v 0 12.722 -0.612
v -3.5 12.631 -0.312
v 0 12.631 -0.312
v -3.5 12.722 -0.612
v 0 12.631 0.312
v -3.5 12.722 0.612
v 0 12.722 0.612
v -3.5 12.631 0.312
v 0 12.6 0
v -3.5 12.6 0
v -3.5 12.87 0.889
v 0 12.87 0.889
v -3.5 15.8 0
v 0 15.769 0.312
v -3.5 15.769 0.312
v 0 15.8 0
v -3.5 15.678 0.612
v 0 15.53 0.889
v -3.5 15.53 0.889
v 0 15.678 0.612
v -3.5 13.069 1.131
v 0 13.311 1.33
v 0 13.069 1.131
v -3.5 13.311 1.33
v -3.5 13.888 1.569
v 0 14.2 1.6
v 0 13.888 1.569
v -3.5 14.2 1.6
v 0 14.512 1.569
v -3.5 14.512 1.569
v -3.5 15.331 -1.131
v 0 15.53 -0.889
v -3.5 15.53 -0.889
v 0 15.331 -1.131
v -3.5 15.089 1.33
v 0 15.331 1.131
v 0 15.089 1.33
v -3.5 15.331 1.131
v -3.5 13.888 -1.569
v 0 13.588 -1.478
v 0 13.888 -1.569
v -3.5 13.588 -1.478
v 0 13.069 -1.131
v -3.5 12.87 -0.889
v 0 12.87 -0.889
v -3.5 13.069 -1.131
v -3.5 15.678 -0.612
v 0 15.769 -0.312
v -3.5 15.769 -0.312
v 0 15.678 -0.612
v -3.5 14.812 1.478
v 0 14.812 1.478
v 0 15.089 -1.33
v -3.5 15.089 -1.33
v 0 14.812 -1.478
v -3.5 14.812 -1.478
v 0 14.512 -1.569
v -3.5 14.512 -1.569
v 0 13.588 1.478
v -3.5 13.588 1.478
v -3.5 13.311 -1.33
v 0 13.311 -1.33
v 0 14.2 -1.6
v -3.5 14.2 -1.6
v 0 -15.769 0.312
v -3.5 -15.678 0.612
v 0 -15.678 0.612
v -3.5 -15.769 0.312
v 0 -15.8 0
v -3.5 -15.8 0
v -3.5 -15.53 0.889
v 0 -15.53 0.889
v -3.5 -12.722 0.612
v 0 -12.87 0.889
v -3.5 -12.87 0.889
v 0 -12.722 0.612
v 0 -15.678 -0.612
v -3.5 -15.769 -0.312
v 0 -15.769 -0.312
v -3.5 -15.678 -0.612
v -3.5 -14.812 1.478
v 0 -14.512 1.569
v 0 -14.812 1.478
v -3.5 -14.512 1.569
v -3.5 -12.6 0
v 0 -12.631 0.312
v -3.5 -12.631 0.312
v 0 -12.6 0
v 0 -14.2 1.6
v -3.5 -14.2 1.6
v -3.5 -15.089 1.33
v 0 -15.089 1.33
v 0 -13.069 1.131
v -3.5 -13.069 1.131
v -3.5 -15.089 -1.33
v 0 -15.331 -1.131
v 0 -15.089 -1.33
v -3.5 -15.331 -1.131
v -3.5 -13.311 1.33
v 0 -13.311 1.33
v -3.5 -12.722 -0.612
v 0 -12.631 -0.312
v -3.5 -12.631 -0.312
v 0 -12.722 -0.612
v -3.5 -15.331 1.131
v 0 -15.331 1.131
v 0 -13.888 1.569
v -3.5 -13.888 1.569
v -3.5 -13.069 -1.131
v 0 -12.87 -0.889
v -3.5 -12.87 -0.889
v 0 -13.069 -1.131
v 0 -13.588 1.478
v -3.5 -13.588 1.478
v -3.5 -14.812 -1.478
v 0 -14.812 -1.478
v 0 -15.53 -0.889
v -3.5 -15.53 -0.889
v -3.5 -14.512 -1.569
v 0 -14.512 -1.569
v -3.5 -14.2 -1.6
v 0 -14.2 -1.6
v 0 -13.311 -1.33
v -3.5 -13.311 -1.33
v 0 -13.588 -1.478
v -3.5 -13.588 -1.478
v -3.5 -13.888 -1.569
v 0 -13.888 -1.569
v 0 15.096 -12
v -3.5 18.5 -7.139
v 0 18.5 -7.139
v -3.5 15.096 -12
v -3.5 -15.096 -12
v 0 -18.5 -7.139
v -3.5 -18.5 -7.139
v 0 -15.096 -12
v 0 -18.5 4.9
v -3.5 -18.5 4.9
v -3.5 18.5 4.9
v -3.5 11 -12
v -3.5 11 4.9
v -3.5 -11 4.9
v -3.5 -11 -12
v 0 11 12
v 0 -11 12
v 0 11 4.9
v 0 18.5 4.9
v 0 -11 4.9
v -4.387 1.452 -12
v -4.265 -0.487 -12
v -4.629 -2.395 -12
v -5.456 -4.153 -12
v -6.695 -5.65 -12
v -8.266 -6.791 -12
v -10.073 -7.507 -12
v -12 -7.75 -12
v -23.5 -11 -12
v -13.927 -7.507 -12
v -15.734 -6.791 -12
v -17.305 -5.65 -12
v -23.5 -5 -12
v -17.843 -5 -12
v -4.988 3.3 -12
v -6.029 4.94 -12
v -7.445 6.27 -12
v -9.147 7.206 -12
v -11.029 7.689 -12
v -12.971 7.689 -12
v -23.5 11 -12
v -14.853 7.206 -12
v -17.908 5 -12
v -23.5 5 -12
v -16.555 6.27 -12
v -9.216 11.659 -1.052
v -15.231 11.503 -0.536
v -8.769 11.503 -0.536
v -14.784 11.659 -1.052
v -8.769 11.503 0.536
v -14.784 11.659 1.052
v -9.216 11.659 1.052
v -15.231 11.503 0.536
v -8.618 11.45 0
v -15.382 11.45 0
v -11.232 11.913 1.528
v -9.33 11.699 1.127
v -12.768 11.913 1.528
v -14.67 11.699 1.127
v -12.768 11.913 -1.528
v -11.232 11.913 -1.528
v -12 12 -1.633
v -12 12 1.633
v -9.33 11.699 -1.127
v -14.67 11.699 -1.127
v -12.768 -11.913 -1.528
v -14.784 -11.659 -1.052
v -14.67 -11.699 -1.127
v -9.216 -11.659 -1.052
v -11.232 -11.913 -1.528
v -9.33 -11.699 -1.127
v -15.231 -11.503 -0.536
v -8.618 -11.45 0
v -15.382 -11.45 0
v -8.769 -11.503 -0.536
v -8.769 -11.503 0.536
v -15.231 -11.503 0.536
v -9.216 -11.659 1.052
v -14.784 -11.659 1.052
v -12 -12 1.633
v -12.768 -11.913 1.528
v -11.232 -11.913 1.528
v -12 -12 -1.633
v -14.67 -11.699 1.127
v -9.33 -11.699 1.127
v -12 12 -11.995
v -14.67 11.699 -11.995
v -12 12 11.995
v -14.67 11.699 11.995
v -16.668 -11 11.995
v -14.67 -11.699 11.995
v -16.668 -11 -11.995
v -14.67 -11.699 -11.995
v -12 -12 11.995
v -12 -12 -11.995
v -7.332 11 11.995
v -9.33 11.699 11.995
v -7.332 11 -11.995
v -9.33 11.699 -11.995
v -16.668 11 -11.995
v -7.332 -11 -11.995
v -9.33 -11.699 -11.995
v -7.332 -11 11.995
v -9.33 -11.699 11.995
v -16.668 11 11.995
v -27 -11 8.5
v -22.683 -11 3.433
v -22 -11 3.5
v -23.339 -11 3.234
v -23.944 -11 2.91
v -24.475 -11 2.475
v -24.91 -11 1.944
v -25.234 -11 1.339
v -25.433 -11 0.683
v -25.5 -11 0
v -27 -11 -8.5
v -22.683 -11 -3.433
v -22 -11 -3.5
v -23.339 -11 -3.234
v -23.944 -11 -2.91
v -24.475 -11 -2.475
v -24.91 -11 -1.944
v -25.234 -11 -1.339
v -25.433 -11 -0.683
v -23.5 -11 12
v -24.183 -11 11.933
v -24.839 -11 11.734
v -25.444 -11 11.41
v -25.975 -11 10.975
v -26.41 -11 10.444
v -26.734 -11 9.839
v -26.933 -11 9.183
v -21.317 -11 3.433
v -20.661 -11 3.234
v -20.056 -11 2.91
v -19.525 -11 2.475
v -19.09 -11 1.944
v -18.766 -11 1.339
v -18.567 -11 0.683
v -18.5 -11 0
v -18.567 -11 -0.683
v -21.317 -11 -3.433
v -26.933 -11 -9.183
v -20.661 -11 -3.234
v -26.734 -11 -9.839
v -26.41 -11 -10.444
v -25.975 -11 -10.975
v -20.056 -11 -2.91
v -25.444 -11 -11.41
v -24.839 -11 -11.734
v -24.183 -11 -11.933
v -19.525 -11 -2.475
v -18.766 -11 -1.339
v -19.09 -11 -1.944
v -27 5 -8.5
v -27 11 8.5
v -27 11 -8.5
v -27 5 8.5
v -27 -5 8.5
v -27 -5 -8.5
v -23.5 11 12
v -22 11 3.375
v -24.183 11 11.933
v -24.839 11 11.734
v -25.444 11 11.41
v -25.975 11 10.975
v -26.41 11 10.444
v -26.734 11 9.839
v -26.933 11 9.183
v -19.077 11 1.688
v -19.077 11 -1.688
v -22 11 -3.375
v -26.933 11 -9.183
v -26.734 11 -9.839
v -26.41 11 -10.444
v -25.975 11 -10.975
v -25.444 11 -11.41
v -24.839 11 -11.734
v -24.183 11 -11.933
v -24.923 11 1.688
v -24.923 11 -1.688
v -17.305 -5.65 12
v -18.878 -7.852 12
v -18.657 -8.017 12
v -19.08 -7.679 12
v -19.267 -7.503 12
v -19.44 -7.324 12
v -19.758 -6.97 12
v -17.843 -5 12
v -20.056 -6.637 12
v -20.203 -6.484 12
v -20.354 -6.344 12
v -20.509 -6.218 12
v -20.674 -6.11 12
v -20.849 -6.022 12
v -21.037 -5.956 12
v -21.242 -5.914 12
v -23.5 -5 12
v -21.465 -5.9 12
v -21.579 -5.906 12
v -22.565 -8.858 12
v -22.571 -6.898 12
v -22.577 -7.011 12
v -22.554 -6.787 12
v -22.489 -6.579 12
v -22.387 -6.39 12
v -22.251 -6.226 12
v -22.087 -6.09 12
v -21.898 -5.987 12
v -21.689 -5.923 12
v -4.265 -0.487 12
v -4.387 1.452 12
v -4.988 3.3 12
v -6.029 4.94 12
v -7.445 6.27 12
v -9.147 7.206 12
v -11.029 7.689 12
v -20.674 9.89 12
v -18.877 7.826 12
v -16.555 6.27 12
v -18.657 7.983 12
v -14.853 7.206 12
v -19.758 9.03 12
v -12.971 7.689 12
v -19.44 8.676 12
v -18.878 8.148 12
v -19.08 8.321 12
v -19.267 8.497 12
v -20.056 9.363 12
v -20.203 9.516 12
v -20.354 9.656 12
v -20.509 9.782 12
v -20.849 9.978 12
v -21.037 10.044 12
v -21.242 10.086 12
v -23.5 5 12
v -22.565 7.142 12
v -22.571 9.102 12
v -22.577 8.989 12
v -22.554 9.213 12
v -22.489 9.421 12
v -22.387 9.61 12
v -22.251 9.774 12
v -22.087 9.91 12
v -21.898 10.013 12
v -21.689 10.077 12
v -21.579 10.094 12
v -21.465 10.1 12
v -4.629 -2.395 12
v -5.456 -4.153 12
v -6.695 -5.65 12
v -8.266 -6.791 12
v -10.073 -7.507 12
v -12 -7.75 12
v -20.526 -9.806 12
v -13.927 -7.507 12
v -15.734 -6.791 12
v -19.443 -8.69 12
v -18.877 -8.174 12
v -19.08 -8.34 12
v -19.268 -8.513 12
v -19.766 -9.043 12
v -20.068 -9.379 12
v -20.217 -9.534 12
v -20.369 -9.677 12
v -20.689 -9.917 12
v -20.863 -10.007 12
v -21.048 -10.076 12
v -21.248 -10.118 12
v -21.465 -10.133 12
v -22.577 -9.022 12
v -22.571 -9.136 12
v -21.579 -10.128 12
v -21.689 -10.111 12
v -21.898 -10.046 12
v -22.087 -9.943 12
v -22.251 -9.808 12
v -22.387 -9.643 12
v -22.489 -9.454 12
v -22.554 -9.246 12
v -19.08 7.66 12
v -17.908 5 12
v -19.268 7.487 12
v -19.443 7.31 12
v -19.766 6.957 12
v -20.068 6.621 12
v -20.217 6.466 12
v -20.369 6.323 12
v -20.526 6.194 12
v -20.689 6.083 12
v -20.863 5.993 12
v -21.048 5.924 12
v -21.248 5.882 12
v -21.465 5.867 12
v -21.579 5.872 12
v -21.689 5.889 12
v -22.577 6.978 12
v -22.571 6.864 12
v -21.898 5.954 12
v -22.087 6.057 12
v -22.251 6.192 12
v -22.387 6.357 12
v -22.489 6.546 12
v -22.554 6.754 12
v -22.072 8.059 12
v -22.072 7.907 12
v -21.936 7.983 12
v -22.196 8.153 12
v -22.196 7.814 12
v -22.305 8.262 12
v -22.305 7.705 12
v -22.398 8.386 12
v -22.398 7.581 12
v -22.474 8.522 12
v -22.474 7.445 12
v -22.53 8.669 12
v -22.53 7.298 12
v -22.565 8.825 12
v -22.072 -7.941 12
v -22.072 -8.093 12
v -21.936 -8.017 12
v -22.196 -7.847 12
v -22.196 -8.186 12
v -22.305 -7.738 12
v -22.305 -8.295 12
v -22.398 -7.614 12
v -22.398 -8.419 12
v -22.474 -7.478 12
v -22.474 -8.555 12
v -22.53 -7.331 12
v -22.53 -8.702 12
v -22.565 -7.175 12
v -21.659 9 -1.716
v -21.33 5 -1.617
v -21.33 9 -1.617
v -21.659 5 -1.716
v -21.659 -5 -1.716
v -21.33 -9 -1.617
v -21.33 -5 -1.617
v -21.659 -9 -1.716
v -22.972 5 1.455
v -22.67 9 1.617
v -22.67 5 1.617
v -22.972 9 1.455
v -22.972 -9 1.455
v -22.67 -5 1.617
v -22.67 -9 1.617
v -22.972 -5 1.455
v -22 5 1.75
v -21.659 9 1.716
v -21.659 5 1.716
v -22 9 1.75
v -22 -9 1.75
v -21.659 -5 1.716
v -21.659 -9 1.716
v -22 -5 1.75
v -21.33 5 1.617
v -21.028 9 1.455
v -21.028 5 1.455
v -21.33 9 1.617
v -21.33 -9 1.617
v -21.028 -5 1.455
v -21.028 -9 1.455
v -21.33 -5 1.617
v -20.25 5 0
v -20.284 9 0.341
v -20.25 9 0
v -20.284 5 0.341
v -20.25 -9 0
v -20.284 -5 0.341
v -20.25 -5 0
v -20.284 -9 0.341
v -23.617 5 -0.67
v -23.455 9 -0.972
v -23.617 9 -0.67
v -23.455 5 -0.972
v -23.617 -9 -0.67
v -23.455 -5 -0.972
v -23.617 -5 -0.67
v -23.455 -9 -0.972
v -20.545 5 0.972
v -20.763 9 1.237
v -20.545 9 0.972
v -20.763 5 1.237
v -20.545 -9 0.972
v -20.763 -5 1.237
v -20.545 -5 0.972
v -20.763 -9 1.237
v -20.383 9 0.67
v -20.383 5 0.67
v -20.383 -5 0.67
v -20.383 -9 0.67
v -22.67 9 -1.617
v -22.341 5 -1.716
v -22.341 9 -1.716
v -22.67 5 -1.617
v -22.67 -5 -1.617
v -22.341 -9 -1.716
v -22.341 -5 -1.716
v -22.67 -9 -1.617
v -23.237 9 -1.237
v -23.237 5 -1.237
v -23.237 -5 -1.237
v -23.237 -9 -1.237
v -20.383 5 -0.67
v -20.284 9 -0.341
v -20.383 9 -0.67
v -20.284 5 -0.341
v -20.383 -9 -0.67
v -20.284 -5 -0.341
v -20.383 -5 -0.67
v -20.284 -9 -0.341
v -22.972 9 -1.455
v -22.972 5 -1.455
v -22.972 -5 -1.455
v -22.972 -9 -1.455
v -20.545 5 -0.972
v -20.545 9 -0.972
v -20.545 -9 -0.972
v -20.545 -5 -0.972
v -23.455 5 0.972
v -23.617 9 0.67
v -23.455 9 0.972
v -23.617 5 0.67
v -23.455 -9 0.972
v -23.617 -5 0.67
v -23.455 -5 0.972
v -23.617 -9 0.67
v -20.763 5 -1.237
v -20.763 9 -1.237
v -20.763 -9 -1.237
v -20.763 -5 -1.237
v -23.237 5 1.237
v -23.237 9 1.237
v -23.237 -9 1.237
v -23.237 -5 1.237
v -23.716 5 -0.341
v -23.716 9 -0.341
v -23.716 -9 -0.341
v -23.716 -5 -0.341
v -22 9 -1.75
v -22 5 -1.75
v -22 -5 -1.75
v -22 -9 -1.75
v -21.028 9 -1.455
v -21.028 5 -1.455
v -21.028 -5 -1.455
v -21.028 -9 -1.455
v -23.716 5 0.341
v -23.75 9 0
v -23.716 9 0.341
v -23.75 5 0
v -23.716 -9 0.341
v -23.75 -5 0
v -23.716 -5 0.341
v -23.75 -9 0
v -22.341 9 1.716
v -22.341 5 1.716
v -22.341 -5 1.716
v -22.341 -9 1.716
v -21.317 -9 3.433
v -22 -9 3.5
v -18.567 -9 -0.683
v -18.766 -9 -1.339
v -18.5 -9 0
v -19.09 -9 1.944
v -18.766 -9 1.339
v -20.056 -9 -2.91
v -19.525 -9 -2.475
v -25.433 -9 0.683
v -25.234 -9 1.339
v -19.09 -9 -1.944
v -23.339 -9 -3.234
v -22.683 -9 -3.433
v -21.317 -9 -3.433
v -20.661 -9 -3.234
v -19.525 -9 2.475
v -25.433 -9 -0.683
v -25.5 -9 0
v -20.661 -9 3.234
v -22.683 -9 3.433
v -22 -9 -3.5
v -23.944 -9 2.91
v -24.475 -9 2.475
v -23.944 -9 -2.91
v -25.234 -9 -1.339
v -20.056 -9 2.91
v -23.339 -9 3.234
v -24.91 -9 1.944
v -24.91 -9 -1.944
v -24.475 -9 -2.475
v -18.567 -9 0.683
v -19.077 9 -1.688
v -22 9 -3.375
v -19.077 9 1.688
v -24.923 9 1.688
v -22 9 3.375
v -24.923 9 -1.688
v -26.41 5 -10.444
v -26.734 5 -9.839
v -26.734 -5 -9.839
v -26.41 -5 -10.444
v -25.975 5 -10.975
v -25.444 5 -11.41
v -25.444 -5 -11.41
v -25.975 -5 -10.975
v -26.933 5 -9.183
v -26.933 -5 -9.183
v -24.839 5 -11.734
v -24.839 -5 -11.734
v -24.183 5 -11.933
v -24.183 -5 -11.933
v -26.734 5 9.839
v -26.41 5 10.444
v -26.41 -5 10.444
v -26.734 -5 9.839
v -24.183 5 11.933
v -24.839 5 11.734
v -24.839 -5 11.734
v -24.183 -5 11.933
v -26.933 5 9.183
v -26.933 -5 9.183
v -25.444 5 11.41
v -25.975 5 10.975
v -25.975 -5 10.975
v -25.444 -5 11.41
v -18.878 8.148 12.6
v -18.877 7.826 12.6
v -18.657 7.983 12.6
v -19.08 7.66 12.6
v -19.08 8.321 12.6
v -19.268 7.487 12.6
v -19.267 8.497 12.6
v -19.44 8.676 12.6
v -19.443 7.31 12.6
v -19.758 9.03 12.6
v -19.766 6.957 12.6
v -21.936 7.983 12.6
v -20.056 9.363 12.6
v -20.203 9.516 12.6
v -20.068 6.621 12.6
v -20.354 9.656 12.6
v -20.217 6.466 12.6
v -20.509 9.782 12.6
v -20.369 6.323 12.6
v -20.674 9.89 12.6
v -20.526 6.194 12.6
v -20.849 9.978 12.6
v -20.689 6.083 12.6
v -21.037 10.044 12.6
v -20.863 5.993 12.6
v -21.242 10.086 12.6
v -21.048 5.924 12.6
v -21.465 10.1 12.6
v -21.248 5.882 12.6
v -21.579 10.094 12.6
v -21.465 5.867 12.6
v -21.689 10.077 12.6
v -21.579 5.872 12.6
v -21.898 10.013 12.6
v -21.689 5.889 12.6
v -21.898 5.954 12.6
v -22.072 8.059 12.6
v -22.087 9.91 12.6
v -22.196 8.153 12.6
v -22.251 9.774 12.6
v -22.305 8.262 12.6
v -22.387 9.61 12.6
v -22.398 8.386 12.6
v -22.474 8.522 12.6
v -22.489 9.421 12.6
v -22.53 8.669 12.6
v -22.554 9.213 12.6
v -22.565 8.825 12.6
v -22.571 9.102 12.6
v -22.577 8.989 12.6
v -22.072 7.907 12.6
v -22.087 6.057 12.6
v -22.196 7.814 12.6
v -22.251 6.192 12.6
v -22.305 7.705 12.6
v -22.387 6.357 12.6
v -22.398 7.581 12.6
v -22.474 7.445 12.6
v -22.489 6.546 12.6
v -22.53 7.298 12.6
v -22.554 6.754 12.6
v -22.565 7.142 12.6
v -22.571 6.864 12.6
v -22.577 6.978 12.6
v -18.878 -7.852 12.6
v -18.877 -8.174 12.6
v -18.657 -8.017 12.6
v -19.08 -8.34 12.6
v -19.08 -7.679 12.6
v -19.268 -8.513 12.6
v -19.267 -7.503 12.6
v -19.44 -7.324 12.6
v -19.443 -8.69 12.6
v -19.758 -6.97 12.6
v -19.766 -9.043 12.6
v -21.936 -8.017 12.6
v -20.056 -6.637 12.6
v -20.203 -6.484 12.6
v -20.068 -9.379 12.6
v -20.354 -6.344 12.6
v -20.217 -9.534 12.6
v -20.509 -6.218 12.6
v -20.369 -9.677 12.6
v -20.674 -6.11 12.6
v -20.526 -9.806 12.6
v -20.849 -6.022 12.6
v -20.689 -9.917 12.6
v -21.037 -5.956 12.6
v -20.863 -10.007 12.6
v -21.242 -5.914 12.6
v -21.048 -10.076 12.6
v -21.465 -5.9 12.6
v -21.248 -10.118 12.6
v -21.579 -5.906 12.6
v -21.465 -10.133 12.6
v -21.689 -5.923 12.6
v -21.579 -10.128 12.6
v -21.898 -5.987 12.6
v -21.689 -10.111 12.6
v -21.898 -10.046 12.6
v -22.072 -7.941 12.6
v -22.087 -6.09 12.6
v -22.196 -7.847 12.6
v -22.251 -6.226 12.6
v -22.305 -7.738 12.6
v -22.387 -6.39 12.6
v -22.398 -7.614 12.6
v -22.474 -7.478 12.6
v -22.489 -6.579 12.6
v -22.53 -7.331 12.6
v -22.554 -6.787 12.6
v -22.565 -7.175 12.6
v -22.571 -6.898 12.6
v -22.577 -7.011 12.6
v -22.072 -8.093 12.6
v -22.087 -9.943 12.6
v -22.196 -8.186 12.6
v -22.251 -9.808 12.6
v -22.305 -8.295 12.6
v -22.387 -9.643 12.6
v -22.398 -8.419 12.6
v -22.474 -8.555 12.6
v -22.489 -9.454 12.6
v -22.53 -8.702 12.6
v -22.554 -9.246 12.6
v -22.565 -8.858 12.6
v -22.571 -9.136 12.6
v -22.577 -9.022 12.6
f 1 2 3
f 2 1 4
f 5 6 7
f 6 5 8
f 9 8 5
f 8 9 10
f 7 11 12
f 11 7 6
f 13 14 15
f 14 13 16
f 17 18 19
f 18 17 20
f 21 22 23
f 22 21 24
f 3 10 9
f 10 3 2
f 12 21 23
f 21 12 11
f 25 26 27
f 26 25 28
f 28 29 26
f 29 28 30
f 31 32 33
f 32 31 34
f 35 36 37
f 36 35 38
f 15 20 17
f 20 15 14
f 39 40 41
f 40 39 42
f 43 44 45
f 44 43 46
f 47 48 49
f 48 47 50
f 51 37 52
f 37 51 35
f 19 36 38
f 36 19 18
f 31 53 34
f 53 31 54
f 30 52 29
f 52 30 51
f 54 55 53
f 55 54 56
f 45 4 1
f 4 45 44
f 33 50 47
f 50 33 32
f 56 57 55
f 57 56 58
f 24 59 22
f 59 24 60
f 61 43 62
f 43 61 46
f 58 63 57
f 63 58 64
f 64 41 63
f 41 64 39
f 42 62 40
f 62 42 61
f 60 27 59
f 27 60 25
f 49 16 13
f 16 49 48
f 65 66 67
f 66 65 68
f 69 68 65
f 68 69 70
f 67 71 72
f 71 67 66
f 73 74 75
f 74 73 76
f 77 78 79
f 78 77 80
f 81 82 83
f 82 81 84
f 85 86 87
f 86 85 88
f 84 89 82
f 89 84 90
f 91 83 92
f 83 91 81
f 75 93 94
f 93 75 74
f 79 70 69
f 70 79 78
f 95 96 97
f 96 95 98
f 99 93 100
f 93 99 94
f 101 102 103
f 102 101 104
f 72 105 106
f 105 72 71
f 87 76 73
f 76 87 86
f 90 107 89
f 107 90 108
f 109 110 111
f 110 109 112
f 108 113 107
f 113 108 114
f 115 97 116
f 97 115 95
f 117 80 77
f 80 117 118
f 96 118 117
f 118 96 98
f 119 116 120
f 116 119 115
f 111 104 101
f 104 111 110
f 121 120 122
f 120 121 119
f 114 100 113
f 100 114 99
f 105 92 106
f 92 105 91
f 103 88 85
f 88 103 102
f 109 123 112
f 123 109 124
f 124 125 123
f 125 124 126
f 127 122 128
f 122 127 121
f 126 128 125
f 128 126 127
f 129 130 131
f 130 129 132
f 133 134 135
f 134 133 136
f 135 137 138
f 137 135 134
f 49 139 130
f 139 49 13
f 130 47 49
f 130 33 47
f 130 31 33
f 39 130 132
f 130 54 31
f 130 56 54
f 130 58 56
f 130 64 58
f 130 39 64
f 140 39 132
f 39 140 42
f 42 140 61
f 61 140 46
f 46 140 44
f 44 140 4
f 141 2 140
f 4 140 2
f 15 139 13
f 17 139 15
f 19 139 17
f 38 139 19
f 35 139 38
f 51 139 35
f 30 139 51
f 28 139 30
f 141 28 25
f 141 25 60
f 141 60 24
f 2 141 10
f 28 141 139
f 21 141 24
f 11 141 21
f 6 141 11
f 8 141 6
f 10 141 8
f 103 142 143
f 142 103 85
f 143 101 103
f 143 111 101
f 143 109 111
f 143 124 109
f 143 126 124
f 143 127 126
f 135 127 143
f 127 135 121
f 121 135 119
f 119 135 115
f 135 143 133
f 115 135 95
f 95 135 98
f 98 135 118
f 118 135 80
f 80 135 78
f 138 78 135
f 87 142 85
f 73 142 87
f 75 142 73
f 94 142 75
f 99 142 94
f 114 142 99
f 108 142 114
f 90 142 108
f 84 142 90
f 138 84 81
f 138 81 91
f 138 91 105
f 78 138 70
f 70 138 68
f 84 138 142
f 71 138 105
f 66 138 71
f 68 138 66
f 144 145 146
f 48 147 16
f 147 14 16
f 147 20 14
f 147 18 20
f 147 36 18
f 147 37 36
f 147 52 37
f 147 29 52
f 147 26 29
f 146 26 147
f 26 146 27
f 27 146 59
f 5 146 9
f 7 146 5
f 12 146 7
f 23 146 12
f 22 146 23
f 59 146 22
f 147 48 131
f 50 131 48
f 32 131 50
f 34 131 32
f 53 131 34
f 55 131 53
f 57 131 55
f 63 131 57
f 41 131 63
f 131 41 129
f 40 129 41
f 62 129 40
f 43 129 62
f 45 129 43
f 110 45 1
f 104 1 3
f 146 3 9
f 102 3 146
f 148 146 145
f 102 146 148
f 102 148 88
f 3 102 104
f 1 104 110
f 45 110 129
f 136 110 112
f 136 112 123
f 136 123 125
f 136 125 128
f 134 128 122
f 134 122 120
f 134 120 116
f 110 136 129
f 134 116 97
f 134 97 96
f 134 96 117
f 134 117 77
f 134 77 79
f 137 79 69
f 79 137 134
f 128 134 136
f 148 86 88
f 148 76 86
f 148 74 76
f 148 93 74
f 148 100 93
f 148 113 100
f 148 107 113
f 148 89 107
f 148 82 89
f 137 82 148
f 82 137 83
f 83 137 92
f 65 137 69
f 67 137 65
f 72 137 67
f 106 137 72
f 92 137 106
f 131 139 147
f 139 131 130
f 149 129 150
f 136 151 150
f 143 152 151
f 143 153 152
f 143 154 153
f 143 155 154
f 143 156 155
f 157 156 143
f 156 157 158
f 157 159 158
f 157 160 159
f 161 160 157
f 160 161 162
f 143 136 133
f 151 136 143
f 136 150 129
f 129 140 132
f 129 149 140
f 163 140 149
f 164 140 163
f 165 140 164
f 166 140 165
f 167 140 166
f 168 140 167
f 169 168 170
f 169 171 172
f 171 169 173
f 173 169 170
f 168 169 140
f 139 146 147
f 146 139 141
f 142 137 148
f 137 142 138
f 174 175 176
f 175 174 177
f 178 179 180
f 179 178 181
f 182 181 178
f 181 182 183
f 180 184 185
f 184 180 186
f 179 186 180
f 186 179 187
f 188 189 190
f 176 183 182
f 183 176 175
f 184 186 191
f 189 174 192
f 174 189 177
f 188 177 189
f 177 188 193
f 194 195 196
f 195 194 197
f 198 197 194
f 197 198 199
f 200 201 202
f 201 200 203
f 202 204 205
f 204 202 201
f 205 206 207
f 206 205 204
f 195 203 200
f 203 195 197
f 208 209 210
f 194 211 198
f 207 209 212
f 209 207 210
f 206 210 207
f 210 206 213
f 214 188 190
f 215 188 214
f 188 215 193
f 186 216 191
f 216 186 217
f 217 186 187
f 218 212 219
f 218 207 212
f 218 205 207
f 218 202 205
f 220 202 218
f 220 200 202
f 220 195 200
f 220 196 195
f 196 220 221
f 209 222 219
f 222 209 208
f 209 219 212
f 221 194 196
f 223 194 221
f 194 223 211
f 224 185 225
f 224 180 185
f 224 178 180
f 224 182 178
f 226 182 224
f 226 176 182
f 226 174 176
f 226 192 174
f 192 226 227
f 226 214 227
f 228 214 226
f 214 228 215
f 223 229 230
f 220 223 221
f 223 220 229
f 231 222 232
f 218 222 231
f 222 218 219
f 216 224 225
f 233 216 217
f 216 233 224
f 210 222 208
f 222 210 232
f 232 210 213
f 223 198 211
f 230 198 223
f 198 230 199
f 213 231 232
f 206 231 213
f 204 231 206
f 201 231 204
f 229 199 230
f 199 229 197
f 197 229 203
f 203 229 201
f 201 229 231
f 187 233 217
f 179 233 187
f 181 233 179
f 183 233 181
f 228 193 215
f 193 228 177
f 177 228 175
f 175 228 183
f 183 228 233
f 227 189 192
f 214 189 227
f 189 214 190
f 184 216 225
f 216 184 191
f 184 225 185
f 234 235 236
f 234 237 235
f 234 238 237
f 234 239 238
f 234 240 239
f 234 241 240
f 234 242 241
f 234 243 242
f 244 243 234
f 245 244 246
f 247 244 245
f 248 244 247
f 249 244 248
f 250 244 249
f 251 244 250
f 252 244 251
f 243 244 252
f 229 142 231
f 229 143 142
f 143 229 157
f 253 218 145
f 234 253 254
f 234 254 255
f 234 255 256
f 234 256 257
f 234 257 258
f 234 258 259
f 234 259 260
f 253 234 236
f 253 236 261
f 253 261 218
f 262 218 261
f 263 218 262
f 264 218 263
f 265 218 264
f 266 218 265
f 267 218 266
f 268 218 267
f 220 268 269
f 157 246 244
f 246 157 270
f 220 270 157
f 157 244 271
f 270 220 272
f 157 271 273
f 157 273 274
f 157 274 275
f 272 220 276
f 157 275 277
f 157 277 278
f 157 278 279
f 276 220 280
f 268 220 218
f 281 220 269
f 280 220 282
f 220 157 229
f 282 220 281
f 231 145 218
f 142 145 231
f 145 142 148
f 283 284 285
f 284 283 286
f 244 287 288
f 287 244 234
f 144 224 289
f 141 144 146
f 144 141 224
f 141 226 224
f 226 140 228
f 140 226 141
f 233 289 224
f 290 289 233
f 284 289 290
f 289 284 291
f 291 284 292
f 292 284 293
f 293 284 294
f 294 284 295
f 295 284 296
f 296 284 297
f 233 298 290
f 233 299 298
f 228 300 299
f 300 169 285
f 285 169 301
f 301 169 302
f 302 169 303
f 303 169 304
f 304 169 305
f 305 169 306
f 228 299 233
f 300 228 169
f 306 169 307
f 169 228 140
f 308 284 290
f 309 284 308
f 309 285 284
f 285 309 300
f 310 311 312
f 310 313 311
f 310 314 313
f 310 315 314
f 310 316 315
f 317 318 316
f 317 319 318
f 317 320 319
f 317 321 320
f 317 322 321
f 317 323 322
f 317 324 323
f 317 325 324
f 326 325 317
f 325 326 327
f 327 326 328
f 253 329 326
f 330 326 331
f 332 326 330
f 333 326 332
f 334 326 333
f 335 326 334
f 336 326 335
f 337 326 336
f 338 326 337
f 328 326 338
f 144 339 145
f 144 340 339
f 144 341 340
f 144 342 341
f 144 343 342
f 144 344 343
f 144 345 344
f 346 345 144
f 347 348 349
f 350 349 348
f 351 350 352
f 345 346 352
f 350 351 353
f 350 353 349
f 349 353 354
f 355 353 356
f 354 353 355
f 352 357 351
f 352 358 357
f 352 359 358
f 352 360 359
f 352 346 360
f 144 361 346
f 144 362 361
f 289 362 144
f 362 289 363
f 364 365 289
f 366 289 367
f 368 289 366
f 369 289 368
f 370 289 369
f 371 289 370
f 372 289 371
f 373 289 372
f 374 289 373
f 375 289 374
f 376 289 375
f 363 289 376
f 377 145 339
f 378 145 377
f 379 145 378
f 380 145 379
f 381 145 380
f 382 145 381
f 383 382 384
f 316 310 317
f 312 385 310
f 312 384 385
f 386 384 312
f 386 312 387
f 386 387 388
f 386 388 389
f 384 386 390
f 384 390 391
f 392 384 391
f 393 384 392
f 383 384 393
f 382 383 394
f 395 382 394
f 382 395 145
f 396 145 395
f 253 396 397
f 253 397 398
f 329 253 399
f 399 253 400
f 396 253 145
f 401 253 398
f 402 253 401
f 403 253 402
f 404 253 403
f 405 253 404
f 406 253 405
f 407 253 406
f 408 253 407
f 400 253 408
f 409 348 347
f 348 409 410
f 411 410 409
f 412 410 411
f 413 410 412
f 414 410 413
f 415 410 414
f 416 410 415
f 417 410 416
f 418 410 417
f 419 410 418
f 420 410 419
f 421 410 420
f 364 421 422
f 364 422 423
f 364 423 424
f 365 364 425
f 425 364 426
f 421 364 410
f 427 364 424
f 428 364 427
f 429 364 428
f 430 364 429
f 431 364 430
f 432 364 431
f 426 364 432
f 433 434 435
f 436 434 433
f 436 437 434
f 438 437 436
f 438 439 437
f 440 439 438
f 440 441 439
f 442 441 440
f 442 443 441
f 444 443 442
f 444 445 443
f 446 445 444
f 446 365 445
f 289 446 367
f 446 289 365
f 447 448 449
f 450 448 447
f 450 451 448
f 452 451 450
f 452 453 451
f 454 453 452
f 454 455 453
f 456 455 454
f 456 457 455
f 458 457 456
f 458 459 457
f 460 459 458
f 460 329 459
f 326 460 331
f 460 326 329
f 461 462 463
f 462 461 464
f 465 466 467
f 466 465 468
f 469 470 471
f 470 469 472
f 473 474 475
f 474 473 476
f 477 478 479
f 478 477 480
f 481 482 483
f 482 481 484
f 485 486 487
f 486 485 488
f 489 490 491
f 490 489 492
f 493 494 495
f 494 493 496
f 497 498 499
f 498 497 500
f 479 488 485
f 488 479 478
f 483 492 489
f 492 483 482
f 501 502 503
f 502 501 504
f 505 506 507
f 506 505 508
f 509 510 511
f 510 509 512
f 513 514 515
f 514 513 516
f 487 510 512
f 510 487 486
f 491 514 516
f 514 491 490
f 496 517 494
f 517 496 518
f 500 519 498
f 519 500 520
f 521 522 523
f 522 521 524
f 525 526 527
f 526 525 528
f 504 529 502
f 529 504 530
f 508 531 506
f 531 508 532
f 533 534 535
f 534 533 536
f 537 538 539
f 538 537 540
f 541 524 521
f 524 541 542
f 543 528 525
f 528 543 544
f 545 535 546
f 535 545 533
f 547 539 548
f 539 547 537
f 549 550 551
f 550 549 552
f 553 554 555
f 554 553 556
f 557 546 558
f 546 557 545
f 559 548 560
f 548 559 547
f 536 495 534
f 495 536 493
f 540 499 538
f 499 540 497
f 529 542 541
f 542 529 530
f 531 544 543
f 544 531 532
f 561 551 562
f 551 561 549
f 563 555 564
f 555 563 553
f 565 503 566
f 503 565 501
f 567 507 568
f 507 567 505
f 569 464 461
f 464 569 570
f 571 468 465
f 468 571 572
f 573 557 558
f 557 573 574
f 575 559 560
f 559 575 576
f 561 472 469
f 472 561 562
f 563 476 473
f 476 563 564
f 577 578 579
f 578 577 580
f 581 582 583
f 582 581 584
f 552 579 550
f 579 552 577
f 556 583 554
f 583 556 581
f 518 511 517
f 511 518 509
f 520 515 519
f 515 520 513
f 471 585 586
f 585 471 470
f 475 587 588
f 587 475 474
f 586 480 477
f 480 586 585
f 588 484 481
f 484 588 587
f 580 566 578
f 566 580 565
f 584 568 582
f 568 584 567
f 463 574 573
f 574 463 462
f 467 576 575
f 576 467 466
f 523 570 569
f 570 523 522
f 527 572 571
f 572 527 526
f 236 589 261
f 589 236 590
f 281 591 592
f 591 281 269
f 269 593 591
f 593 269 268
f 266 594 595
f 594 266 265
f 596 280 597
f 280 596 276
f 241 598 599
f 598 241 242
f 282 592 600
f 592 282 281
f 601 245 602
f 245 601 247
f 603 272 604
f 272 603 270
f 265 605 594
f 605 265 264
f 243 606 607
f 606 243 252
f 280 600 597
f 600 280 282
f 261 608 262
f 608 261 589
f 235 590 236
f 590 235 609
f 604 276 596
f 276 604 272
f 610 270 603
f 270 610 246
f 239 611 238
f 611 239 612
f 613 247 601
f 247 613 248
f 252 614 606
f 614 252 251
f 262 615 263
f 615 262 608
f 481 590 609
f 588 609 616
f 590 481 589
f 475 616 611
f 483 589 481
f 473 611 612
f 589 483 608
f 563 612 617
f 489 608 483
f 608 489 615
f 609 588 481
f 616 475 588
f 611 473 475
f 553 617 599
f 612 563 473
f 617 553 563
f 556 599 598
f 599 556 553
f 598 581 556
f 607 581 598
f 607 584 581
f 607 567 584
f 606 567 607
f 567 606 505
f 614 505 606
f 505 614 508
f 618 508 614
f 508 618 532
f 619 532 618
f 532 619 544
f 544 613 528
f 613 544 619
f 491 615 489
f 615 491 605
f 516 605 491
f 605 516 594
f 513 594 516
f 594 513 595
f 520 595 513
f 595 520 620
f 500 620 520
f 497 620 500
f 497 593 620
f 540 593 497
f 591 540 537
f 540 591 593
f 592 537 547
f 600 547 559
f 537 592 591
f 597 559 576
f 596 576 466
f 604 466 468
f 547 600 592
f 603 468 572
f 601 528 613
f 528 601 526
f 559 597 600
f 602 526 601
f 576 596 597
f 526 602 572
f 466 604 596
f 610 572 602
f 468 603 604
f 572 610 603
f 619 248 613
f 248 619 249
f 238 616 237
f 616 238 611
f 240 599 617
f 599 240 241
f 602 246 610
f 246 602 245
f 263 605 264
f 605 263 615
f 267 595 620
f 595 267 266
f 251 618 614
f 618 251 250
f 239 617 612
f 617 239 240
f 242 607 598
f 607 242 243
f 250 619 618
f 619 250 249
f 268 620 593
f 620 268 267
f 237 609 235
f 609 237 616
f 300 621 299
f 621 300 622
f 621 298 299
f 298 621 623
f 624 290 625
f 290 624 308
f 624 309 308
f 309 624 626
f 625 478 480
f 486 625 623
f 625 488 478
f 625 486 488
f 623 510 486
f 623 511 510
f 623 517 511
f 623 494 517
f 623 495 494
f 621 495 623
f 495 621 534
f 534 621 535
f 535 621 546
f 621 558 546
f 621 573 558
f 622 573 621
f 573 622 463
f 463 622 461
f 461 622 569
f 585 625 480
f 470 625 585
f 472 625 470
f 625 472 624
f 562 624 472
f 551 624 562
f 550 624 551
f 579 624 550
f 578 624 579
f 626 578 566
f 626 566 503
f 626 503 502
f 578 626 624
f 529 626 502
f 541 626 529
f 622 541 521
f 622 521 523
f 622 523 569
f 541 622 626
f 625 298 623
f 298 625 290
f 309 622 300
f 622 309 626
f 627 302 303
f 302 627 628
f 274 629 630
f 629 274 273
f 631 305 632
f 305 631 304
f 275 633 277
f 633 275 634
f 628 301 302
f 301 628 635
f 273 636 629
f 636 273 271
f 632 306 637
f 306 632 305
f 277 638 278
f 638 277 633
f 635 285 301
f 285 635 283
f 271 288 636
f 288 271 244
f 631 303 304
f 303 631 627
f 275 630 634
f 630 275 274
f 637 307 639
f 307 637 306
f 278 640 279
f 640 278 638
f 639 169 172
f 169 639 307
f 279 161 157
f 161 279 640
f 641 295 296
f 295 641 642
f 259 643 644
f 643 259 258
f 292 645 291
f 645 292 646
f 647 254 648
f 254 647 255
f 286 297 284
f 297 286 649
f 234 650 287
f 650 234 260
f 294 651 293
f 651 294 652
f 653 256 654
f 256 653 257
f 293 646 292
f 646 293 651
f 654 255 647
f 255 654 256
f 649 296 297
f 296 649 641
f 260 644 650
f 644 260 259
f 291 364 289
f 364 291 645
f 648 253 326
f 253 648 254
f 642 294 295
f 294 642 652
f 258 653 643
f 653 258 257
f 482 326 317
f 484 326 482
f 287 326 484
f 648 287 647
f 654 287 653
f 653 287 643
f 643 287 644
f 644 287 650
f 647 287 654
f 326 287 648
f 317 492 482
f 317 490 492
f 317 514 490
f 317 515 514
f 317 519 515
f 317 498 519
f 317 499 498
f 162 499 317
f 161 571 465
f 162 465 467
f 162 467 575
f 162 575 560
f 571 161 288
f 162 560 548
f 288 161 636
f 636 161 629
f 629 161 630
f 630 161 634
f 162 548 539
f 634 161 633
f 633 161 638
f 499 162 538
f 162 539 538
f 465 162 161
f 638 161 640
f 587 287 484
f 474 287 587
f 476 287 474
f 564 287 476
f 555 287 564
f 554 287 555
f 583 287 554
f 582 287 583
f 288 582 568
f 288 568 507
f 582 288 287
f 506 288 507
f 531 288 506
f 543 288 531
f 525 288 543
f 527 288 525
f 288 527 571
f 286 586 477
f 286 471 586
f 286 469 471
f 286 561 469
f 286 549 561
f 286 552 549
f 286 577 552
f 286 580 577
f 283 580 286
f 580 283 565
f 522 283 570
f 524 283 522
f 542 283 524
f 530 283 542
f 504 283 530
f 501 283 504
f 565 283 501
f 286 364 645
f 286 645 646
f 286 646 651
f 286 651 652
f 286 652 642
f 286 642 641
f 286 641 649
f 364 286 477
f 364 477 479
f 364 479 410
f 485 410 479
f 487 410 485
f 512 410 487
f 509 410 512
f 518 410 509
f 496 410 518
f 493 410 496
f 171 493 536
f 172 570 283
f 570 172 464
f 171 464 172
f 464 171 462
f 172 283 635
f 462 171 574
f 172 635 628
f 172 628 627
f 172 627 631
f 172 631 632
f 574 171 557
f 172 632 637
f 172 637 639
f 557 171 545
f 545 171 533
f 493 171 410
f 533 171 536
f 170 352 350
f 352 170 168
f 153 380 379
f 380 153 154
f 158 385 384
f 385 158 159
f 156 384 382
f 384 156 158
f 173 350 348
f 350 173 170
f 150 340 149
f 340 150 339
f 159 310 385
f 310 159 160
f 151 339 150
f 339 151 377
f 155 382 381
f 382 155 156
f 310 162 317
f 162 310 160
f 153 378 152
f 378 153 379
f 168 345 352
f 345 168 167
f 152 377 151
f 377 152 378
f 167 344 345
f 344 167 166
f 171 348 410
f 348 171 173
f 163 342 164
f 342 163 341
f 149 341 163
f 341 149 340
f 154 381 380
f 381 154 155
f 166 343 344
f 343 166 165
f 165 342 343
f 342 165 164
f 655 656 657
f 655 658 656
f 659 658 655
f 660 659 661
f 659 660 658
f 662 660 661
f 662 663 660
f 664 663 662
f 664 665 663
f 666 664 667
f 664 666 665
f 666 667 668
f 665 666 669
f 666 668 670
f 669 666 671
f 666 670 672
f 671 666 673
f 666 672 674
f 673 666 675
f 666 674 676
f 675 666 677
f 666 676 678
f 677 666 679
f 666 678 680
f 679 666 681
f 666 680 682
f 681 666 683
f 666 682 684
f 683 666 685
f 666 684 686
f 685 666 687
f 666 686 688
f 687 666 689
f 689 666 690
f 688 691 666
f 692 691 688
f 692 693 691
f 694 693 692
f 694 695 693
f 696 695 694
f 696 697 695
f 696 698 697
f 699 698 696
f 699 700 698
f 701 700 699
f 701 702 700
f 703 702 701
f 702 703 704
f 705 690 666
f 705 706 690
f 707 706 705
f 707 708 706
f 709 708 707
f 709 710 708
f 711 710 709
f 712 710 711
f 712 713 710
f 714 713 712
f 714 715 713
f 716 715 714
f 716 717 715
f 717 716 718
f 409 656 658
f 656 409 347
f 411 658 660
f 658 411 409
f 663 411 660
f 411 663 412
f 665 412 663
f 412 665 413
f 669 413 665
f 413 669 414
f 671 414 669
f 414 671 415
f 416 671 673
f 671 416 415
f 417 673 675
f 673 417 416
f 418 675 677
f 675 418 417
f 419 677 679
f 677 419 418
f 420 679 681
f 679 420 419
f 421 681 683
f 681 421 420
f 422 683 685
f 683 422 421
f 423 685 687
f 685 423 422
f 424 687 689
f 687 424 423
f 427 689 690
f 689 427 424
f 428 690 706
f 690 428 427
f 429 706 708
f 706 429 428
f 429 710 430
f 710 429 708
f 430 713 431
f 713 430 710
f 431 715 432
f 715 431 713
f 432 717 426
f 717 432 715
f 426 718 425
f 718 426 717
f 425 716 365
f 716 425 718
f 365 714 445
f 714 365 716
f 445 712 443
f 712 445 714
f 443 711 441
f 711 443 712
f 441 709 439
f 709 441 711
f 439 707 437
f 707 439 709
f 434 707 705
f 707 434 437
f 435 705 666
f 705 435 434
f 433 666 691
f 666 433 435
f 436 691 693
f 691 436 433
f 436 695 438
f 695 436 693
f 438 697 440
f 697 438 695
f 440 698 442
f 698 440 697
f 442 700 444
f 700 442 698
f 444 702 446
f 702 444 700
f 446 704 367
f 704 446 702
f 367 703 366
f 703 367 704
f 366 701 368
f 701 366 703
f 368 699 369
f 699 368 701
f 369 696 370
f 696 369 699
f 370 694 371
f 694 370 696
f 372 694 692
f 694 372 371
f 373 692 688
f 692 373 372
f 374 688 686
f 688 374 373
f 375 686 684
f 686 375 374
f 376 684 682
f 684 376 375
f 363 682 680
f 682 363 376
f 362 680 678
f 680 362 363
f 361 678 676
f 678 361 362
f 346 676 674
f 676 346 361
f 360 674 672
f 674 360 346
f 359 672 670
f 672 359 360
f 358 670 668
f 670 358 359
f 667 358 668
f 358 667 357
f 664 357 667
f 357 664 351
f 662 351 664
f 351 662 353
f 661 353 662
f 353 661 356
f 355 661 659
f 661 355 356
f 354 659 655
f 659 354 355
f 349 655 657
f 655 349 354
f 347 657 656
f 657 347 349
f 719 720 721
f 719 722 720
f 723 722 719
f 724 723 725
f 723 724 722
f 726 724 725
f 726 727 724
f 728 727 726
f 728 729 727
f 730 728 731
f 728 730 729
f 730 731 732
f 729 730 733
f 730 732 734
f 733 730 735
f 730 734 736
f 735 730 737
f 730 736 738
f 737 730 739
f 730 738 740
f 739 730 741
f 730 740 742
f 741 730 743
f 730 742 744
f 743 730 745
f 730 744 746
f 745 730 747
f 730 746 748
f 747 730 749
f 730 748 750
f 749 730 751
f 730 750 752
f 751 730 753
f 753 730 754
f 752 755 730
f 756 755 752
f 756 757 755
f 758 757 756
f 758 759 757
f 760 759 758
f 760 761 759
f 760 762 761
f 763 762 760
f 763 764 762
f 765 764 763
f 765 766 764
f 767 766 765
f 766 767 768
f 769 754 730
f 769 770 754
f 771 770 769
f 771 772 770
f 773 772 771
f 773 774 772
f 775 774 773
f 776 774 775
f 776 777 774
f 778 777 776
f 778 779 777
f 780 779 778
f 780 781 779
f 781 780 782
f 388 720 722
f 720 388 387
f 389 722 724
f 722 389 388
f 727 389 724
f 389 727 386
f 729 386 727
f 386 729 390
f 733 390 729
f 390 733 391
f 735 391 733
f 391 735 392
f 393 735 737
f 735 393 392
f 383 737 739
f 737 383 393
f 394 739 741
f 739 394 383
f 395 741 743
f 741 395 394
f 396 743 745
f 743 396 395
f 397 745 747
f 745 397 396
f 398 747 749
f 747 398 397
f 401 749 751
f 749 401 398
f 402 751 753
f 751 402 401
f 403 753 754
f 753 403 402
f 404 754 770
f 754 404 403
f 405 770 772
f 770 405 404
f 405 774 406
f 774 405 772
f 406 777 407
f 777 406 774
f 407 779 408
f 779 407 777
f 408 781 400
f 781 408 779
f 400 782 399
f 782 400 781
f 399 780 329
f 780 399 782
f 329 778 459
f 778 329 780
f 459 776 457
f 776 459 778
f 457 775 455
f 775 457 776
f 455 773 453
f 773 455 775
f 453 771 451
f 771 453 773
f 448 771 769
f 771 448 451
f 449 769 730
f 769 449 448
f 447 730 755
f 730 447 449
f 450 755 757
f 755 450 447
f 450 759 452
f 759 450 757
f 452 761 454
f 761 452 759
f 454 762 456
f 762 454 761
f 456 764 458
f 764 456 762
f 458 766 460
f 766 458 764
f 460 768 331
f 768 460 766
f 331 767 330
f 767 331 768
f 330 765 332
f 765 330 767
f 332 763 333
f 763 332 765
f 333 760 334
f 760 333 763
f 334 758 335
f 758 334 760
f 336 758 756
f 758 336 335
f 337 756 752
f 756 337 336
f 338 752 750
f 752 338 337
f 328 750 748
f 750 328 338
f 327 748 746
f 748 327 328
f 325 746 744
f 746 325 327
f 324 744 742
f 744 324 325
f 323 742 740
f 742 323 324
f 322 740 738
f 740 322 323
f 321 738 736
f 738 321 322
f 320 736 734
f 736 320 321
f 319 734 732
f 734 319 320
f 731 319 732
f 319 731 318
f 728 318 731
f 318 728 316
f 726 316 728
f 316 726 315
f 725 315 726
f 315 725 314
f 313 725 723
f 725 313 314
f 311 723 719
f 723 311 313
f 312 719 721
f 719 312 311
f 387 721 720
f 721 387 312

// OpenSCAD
lm8uu_length = 24;
lm8luu_length = 45;
height = 27;

retaining_hole_offset = 5;
retaining_hole_diam = 3.5;
retaining_hole_countersink_diam = 7;
retaining_hole_countersink_depth = 2;
retaining_hole_nuttrap_depth = 4.1;

block_width = 22;
barrel_diam = 24;
barrel_offset = 12;
gap_width = 10;
lm8uu_diam = 15.5;

mount_width = 37;
mount_height = 3.5;
mount_hole_spacing = 28.4;
mount_hole_diam = 3.2;
mount_screwhead_clearance_diam = 5.5;

corner_round_diam = 7;
emboss_heart_height = 0.6;
DEBUG = 0;

if (true)
{   
    rotate([90 * (1-DEBUG), 0, -90 * (1-DEBUG)])
    lm8uu_holder();
}

module lm8uu_holder()
{
    bearing_holder(length = lm8uu_length);
}

module lm8luu_holder()
{
    bearing_holder(length = lm8luu_length);
}

module bearing_holder2(length = lm8uu_length)
{
        union()
        {
            // main block
            translate([0, 0, height/2])
            cube([block_width, length, height], center=true);

            translate([0, 0, barrel_offset])
            translate([0, -0.05/2, 0])
            rotate([90, 0, 0])
            cylinder(d=barrel_diam, h=length-0.05, center=true, $fn=28);
        }
}

module bearing_holder(length = lm8uu_length)
{
    // mount plate
    color("greenyellow") difference()
    {
        translate([0, 0, mount_height/2])
        cube([mount_width, length, mount_height], center=true);
        
        // mount holes
        for(i=[-1, 1])
            translate([mount_hole_spacing/2*i, 0, 0])
            cylinder(d=mount_hole_diam, h=50, $fn=32, center=true);
        
        // remove the mount plate above the hole, we don't need it
        translate([0, 50, 0])
        translate([0, mount_hole_diam/2+3.3, 0])
        cube([100, 100, 100], center=true);
        
        // cut the corner at the bottom
        for(i=[-1, 1])
            translate([mount_hole_spacing/2*i, 0, mount_height/2])
            translate([7*i, -length/2, 0])
            rotate([0, 0, -35*i])
            cube([10, 10, mount_height+2], center=true);
    }
    
    color("greenyellow") difference()
    {
        union()
        {
            // main block
            translate([0, 0, height/2])
            cube([block_width, length, height], center=true);

            // barrel
            difference()
            {
                translate([0, 0, barrel_offset])
                rotate([90, 0, 0])
                // need the tiny epsilon to avoid manifold errors in stl
                cylinder(d=barrel_diam, h=length-0.01, center=true, $fn=28);
                
                // cut everything lower than the mountplate
                translate([0, 0, -50])
                translate([0, 0, mount_height])
                cube([100, 100, 100], center=true);
                
                // make clearance for the heads of the mounting screws to be inserted
                for(i=[-1, 1])
                    translate([mount_hole_spacing/2*i, 0, 0])
                    cylinder(d=mount_screwhead_clearance_diam, h=height*2+1, $fn=32, center=true);
            }
        }
        
        // square cutout at top
        translate([0, 0, height/2+height/4])
        cube([gap_width, length+1, height/2+0.1], center=true);
        
        // hollow out barrel
        translate([0, 0, barrel_offset])
        rotate([90, 0, 0])
        cylinder(d=lm8uu_diam, h=length+0.1, center=true, $fn=25);
        
        // retaining hole for squeezing lm8uu
        translate([0, 0, height])
        translate([0, 0, -retaining_hole_offset])
        {
            rotate([0, 90, 0])
            cylinder(d=retaining_hole_diam, h=block_width+1, $fn=32, center=true);
            
            // countersinking for retaining hole screwhead on one side
            translate([block_width/2, 0, 0])
            translate([0.1, 0, 0])     // epsilon
            rotate([0, 0, 180])
            rotate([0, 90, 0])
            cylinder(d=retaining_hole_countersink_diam, h=retaining_hole_countersink_depth+0.1, $fn=32);
            
            // nut trap on the other side
            translate([-block_width/2, 0, 0])
            translate([-0.1, 0, 0])     // epsilon
            rotate([0, 90, 0])
            rotate([0, 0, 360/6/2])
            cylinder(r=5.5 / cos(180 / 6) / 2 + 0.2, h=retaining_hole_nuttrap_depth+0.1, $fn=6, center=true);
        }
        
        // rounded corners
        for(i=[-1,1])
        {
            translate([0, 0, height])
            translate([0, 0, -corner_round_diam/2])
            translate([0, length/2 * i, 0])
            translate([0, -corner_round_diam/2 * i, 0])
            rounded_corner(diam = corner_round_diam, side = i);
        }
    }
    
    // hearts on top of bearing
    for(i=[-1,1])
    {
        translate([0, length/2, 0])
        translate([0, emboss_heart_height/2, 0])
        translate([0, 0, height])
        translate([block_width/2*i, 0, 0])
        translate([-(block_width-gap_width)/4*i, 0, 0])
        translate([0, 0, -6])
        {
            //%cube([3, 3, 3], center=true);
            
            translate([-2.1, 0, -2.5])
            rotate([90, 0, 0])
            color(DEBUG ? "blueviolet" : "greenyellow")
            linear_extrude(height=emboss_heart_height, center=true)
            scale([0.075, 0.075, 1])
            import("heart.dxf", center=true);
        }
    }
}

module rounded_corner(diam, side)
{
    difference()
    {
        cube([500, diam+0.1, diam+0.1], center=true);
        
        rotate([0, 90, 0])
        cylinder(d=diam, h=501, $fn=32, center=true);
        
        // cut off the bottom half
        translate([0, 0, -diam/2])
        cube([502, diam+1, diam], center=true);
        
        // cut off either the left or right side depending on side variable
        translate([0, diam/2 * -side, 0])
        cube([502, diam, diam+1], center=true);
    }
}
